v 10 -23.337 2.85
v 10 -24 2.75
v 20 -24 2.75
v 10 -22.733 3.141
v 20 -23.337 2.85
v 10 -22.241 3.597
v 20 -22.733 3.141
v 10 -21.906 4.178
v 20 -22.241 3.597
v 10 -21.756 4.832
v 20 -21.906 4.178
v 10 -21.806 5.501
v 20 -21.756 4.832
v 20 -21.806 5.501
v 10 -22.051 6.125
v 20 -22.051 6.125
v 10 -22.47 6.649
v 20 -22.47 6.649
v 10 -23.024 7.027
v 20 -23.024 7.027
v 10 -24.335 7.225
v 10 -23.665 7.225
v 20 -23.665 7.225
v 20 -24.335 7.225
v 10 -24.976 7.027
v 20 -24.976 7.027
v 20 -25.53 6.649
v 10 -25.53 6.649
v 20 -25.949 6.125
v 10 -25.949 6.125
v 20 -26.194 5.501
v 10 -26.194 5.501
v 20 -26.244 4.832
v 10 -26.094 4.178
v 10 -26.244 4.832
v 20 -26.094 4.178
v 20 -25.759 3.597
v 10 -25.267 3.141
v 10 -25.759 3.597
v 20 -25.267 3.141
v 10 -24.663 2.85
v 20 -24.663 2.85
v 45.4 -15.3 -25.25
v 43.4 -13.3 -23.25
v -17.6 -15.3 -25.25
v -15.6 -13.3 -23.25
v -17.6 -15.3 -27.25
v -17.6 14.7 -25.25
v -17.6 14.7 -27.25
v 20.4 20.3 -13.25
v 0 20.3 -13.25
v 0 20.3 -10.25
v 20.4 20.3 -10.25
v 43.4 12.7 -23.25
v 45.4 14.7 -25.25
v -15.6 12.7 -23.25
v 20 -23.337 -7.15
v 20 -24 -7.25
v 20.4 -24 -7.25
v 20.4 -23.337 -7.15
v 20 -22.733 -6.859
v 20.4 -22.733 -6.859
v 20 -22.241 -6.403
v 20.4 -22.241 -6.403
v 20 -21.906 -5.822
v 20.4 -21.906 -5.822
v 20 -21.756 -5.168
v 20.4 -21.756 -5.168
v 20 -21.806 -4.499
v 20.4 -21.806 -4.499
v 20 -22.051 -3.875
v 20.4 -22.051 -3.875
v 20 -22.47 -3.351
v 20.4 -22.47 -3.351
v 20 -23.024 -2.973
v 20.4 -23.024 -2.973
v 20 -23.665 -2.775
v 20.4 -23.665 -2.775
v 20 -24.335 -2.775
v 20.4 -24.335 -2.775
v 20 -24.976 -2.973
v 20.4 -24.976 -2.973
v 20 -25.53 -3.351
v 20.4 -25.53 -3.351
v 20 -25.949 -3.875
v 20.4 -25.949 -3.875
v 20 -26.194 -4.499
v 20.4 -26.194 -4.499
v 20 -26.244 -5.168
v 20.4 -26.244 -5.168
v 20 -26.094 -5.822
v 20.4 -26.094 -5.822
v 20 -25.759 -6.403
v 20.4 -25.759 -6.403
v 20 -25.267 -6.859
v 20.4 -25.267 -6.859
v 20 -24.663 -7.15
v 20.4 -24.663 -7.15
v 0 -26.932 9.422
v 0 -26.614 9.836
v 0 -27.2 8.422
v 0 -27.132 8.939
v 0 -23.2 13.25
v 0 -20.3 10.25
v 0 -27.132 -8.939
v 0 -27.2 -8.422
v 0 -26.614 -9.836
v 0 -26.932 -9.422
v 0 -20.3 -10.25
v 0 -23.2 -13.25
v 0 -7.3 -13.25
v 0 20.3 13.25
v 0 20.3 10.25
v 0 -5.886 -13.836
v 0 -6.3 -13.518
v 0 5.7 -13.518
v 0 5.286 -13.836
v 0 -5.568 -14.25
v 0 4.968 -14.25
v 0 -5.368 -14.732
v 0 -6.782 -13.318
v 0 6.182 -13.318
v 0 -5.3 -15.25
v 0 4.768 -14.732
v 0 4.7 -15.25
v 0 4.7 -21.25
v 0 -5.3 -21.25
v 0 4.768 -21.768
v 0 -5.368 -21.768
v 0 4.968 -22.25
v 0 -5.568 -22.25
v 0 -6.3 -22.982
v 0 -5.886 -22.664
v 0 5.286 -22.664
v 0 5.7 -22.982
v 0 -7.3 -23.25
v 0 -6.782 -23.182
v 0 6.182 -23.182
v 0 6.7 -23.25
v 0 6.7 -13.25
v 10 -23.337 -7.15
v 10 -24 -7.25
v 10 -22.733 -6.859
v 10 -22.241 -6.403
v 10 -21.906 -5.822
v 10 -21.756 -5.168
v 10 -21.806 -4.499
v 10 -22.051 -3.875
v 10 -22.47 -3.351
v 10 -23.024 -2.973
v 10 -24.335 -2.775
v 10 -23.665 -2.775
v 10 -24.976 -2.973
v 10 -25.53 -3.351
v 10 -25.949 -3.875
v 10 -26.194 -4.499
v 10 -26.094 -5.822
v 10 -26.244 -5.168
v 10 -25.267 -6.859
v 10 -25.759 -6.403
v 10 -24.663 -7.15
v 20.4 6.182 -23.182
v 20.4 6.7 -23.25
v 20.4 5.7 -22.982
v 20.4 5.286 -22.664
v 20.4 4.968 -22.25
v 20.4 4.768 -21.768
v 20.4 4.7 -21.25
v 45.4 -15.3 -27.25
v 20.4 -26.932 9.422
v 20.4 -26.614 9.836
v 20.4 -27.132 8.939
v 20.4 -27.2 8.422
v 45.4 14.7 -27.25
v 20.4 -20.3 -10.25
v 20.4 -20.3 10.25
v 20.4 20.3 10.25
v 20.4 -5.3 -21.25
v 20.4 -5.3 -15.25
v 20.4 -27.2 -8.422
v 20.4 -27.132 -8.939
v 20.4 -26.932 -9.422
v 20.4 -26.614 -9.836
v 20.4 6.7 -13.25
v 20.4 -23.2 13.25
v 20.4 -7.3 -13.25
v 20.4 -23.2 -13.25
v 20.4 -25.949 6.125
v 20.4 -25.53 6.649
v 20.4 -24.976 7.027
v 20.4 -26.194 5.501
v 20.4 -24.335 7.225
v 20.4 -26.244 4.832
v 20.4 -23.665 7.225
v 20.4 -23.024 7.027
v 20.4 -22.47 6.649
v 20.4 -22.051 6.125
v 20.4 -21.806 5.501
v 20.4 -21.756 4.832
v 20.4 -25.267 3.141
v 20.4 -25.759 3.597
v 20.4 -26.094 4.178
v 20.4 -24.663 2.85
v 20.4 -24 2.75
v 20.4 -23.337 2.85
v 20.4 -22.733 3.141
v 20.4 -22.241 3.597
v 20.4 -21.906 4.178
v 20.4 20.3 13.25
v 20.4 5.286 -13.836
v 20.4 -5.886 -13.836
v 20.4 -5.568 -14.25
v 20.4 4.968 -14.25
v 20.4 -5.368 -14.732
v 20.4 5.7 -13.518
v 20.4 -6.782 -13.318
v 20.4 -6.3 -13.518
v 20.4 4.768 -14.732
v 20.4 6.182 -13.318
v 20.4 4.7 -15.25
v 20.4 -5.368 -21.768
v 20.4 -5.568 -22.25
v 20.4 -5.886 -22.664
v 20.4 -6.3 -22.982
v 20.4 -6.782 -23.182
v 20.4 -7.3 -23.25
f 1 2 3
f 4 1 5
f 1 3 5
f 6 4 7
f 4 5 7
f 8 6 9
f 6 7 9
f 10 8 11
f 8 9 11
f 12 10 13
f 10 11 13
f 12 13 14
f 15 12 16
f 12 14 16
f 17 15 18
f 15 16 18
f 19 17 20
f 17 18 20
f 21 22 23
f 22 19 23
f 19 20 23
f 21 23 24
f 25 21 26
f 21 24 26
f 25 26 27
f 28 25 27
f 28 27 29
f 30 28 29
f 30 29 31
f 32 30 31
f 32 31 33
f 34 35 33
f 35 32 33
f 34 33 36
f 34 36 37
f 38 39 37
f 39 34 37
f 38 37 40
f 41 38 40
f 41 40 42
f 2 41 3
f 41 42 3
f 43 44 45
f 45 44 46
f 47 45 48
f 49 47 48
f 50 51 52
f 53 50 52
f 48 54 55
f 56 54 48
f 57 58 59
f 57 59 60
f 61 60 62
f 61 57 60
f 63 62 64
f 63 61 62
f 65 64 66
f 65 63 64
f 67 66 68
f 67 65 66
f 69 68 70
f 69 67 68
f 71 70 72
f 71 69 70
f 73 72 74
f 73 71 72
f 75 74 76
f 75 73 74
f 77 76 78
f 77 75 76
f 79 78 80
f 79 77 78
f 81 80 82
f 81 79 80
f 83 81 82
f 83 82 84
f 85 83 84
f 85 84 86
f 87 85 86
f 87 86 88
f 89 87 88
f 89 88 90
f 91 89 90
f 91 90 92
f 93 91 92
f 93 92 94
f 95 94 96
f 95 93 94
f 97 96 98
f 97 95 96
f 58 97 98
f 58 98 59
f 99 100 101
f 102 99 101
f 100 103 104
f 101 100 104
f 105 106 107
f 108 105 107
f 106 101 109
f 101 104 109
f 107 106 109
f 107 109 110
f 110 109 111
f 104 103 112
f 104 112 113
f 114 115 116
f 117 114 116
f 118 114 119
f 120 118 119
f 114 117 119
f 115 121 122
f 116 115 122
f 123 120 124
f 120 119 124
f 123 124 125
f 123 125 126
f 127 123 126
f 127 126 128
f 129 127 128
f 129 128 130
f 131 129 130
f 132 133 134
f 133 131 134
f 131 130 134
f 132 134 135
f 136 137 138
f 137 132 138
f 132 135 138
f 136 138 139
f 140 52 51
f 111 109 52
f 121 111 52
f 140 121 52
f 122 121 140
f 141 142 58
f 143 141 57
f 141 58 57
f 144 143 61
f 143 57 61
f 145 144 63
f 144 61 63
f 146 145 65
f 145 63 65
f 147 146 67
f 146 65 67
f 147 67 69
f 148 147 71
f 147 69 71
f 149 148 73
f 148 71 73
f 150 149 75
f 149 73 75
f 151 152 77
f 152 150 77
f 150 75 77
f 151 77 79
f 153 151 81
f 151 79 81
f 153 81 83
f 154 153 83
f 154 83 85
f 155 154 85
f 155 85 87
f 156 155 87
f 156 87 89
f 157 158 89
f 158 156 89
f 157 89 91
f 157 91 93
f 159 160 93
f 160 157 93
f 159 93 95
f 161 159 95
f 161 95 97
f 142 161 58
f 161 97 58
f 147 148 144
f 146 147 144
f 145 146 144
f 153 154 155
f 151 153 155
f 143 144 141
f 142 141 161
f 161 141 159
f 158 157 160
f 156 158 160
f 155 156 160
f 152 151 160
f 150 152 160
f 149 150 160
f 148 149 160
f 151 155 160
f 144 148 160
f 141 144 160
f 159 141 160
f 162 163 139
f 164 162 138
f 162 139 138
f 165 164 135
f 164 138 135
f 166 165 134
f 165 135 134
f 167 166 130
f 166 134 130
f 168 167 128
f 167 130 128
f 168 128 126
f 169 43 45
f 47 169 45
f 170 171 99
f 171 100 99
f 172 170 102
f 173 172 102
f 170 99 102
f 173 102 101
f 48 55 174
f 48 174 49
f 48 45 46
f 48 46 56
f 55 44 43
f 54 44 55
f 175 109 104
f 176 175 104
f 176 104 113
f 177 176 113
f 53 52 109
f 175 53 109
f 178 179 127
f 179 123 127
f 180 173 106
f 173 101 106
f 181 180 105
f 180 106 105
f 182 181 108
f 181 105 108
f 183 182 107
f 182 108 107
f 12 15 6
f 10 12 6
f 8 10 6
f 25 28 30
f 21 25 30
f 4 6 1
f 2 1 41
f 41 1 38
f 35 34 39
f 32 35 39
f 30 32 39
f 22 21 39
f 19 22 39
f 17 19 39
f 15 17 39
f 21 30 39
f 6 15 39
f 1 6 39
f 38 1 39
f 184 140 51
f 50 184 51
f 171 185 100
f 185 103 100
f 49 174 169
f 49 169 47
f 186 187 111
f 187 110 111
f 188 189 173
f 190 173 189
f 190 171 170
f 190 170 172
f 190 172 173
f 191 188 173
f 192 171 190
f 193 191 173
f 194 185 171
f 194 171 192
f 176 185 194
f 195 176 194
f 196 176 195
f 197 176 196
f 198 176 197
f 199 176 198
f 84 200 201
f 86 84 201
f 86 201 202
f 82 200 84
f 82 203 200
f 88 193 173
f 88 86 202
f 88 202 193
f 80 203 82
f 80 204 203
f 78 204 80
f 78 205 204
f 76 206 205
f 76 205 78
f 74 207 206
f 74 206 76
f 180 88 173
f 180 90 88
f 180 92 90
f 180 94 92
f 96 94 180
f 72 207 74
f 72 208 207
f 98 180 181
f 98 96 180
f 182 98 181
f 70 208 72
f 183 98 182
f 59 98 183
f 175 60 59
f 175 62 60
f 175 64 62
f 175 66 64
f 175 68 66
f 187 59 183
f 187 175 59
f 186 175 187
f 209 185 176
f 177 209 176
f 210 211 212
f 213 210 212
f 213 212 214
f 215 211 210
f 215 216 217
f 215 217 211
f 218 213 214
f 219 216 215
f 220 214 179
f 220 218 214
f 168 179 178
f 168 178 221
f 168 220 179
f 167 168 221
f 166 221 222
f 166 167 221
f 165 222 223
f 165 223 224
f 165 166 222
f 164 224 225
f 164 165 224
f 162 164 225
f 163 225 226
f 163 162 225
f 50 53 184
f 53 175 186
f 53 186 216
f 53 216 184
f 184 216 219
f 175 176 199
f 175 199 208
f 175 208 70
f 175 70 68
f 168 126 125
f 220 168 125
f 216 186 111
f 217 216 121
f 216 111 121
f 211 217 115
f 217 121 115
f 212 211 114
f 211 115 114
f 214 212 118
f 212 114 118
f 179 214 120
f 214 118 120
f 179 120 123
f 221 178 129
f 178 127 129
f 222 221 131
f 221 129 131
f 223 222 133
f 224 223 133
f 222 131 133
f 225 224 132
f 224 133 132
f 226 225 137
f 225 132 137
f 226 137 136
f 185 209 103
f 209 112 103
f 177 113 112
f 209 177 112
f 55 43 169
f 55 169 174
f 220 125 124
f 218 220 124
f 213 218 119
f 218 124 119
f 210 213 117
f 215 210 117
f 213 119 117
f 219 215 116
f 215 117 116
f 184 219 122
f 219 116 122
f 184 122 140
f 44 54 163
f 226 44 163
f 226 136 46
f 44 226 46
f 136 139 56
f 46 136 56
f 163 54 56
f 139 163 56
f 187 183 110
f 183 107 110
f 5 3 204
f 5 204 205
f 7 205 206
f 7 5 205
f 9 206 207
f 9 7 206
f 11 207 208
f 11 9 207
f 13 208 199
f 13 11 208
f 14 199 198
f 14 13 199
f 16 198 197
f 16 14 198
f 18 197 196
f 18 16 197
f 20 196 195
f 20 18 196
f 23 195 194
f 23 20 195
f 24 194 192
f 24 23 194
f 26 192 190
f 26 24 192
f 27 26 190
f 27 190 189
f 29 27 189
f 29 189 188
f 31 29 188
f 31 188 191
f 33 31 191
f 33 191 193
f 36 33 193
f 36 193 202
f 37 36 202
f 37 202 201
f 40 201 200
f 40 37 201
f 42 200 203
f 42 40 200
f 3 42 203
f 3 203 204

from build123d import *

# Parameters (mm, degrees)
SKETCH1_R            = 2.25
BOSS_EXTRUDE1_DEPTH  = 20
SKETCH2_R            = 2.25
BOSS_EXTRUDE2_DEPTH  = 10
SKETCH4_W            = 26.5
SKETCH4_H            = 2.5
CUT_EXTRUDE1_DEPTH   = 39.17921555
CHAMFER2_SIZE        = 4
CHAMFER3_SIZE        = 4
FILLET4_R            = 2
SKETCH7_W            = 10
SKETCH7_H            = 10
BOSS_EXTRUDE5_DEPTH  = 20
FILLET6_R            = 2
SKETCH8_W            = 63
SKETCH8_H            = 30
BOSS_EXTRUDE6_DEPTH  = 4
CHAMFER4_SIZE        = 2
FILLET7_R            = 2
SKETCH13_R           = 2.25
BOSS_EXTRUDE8_DEPTH  = 20
CUT_EXTRUDE2_DEPTH   = 54.816005983
BOSS_EXTRUDE9_START  = -10
SKETCH14_R           = 2.25
BOSS_EXTRUDE9_DEPTH  = 10
SKETCH15_R           = 2.25
BOSS_EXTRUDE10_DEPTH = 0.4


with BuildPart() as part:
    # Sketch1 → Boss-Extrude1 (new body)
    with BuildSketch(Plane(origin=(0, 0, 0), x_dir=(0, 0, -1), z_dir=(1, 0, 0))):
        Polygon((10.25, -20.3), (13.25, -20.3), (13.25, 29.7), (-13.25, 29.7), (-13.25, -20.3), (-10.25, -20.3), (-10.25, 20.3), (10.25, 20.3), align=None)
        with Locations((5, 24)):
            Circle(SKETCH1_R, mode=Mode.SUBTRACT)
        with Locations((-5, 24)):
            Circle(SKETCH1_R, mode=Mode.SUBTRACT)
    extrude(amount=BOSS_EXTRUDE1_DEPTH)

    # Sketch2 → Boss-Extrude2 (add)
    with BuildSketch(Plane.ZY):
        with Locations((-5, 24)):
            Circle(SKETCH2_R)
        with Locations((5, 24)):
            Circle(SKETCH2_R)
    extrude(amount=-BOSS_EXTRUDE2_DEPTH)

    # Sketch4 → Cut-Extrude1 (cut, through all)
    with BuildSketch(Plane(origin=(20, 0, 0), x_dir=(0, 0, -1), z_dir=(1, 0, 0))):
        with Locations((0, 28.45)):
            Rectangle(SKETCH4_W, SKETCH4_H)
    extrude(amount=-CUT_EXTRUDE1_DEPTH, mode=Mode.SUBTRACT)

    # Chamfer2
    chamfer2_edges = [part.edges().sort_by_distance(p)[0] for p in [
        (10, 27.2, -13.25),
    ]]
    chamfer(chamfer2_edges, length=CHAMFER2_SIZE)

    # Chamfer3
    chamfer3_edges = [part.edges().sort_by_distance(p)[0] for p in [
        (10, 27.2, 13.25),
    ]]
    chamfer(chamfer3_edges, length=CHAMFER3_SIZE)

    # Fillet4
    fillet4_edges = [part.edges().sort_by_distance(p)[0] for p in [
        (10, 27.2, -9.25),
        (10, 27.2, 9.25),
    ]]
    fillet(fillet4_edges, radius=FILLET4_R)

    # Sketch7 → Boss-Extrude5 (add)
    with BuildSketch(Plane(origin=(20, 0, 0), x_dir=(0, 0, -1), z_dir=(1, 0, 0))):
        with Locations((18.25, -0.3)):
            Rectangle(SKETCH7_W, SKETCH7_H)
    extrude(amount=-BOSS_EXTRUDE5_DEPTH)

    # Fillet6
    fillet6_edges = [part.edges().sort_by_distance(p)[0] for p in [
        (10, -5.3, -13.25),
        (10, 4.7, -13.25),
    ]]
    fillet(fillet6_edges, radius=FILLET6_R)

    # Sketch8 → Boss-Extrude6 (add)
    with BuildSketch(Plane(origin=(0, 0, -23.25), x_dir=(-1, 0, 0), z_dir=(0, 0, -1))):
        with Locations((-13.9, -0.3)):
            Rectangle(SKETCH8_W, SKETCH8_H)
    extrude(amount=BOSS_EXTRUDE6_DEPTH)

    # Chamfer4
    chamfer4_edges = [part.edges().sort_by_distance(p)[0] for p in [
        (45.4, -0.3, -23.25),
        (13.9, -15.3, -23.25),
        (-17.6, -0.3, -23.25),
        (13.9, 14.7, -23.25),
    ]]
    chamfer(chamfer4_edges, length=CHAMFER4_SIZE)

    # Fillet7
    fillet7_edges = [part.edges().sort_by_distance(p)[0] for p in [
        (10, 4.7, -23.25),
        (10, -5.3, -23.25),
    ]]
    fillet(fillet7_edges, radius=FILLET7_R)

    # Sketch13 → Boss-Extrude8 (add)
    with BuildSketch(Plane(origin=(20, 0, 0), x_dir=(0, 0, -1), z_dir=(1, 0, 0))):
        with BuildLine():
            Line((-13.25, -23.2), (-9.835786438, -26.614213562))
            ThreePointArc((-9.835786438, -26.614213562), (-9.18693974, -27.047759065), (-8.421572875, -27.2))
            Line((-8.421572875, -27.2), (8.421572875, -27.2))
            ThreePointArc((8.421572875, -27.2), (9.18693974, -27.047759065), (9.835786438, -26.614213562))
            Line((9.835786438, -26.614213562), (13.25, -23.2))
            Line((13.25, -23.2), (13.25, -20.3))
            Line((13.25, -20.3), (-13.25, -20.3))
            Line((-13.25, -20.3), (-13.25, -23.2))
        make_face()
        with Locations((5, -24)):
            Circle(SKETCH13_R, mode=Mode.SUBTRACT)
        with Locations((-5, -24)):
            Circle(SKETCH13_R, mode=Mode.SUBTRACT)
    extrude(amount=-BOSS_EXTRUDE8_DEPTH)

    # Sketch12 → Cut-Extrude2 (cut, through all)
    with BuildSketch(Plane(origin=(20, 0, 0), x_dir=(0, 0, -1), z_dir=(1, 0, 0))):
        with BuildLine():
            Line((13.25, 23.2), (9.835786438, 26.614213562))
            ThreePointArc((9.835786438, 26.614213562), (9.18693974, 27.047759065), (8.421572875, 27.2))
            Line((8.421572875, 27.2), (-8.421572875, 27.2))
            ThreePointArc((-8.421572875, 27.2), (-9.18693974, 27.047759065), (-9.835786438, 26.614213562))
            Line((-9.835786438, 26.614213562), (-13.25, 23.2))
            Line((-13.25, 23.2), (-13.25, 20.3))
            Line((-13.25, 20.3), (13.25, 20.3))
            Line((13.25, 20.3), (13.25, 23.2))
        make_face()
    extrude(amount=-CUT_EXTRUDE2_DEPTH, mode=Mode.SUBTRACT)

    # Sketch14 → Boss-Extrude9 (add)
    with BuildSketch(Plane.ZY.offset(BOSS_EXTRUDE9_START)):
        with Locations(Location((-5, -24, 0), (0, 0, 180))):
            Circle(SKETCH14_R)
        with Locations(Location((5, -24, 0), (0, 0, 180))):
            Circle(SKETCH14_R)
    extrude(amount=BOSS_EXTRUDE9_DEPTH)

    # Sketch15 → Boss-Extrude10 (add)
    with BuildSketch(Plane(origin=(20, 0, 0), x_dir=(0, 0, -1), z_dir=(1, 0, 0))):
        with BuildLine():
            Line((-10.25, 20.3), (-13.25, 20.3))
            Line((-13.25, 20.3), (-13.25, -23.2))
            Line((-13.25, -23.2), (-9.835786438, -26.614213562))
            ThreePointArc((-9.835786438, -26.614213562), (-9.18693974, -27.047759065), (-8.421572875, -27.2))
            Line((-8.421572875, -27.2), (8.421572875, -27.2))
            ThreePointArc((8.421572875, -27.2), (9.18693974, -27.047759065), (9.835786438, -26.614213562))
            Line((9.835786438, -26.614213562), (13.25, -23.2))
            Line((13.25, -23.2), (13.25, -7.3))
            ThreePointArc((13.25, -7.3), (13.835786438, -5.885786438), (15.25, -5.3))
            Line((15.25, -5.3), (21.25, -5.3))
            ThreePointArc((21.25, -5.3), (22.664213562, -5.885786438), (23.25, -7.3))
            Line((23.25, -7.3), (23.25, 6.7))
            ThreePointArc((23.25, 6.7), (22.664213562, 5.285786438), (21.25, 4.7))
            Line((21.25, 4.7), (15.25, 4.7))
            ThreePointArc((15.25, 4.7), (13.835786438, 5.285786438), (13.25, 6.7))
            Line((13.25, 6.7), (13.25, 20.3))
            Line((13.25, 20.3), (10.25, 20.3))
            Line((10.25, 20.3), (10.25, -20.3))
            Line((10.25, -20.3), (-10.25, -20.3))
            Line((-10.25, -20.3), (-10.25, 20.3))
        make_face()
        with Locations((5, -24)):
            Circle(SKETCH15_R, mode=Mode.SUBTRACT)
        with Locations((-5, -24)):
            Circle(SKETCH15_R, mode=Mode.SUBTRACT)
    extrude(amount=BOSS_EXTRUDE10_DEPTH)


solid = part.part
